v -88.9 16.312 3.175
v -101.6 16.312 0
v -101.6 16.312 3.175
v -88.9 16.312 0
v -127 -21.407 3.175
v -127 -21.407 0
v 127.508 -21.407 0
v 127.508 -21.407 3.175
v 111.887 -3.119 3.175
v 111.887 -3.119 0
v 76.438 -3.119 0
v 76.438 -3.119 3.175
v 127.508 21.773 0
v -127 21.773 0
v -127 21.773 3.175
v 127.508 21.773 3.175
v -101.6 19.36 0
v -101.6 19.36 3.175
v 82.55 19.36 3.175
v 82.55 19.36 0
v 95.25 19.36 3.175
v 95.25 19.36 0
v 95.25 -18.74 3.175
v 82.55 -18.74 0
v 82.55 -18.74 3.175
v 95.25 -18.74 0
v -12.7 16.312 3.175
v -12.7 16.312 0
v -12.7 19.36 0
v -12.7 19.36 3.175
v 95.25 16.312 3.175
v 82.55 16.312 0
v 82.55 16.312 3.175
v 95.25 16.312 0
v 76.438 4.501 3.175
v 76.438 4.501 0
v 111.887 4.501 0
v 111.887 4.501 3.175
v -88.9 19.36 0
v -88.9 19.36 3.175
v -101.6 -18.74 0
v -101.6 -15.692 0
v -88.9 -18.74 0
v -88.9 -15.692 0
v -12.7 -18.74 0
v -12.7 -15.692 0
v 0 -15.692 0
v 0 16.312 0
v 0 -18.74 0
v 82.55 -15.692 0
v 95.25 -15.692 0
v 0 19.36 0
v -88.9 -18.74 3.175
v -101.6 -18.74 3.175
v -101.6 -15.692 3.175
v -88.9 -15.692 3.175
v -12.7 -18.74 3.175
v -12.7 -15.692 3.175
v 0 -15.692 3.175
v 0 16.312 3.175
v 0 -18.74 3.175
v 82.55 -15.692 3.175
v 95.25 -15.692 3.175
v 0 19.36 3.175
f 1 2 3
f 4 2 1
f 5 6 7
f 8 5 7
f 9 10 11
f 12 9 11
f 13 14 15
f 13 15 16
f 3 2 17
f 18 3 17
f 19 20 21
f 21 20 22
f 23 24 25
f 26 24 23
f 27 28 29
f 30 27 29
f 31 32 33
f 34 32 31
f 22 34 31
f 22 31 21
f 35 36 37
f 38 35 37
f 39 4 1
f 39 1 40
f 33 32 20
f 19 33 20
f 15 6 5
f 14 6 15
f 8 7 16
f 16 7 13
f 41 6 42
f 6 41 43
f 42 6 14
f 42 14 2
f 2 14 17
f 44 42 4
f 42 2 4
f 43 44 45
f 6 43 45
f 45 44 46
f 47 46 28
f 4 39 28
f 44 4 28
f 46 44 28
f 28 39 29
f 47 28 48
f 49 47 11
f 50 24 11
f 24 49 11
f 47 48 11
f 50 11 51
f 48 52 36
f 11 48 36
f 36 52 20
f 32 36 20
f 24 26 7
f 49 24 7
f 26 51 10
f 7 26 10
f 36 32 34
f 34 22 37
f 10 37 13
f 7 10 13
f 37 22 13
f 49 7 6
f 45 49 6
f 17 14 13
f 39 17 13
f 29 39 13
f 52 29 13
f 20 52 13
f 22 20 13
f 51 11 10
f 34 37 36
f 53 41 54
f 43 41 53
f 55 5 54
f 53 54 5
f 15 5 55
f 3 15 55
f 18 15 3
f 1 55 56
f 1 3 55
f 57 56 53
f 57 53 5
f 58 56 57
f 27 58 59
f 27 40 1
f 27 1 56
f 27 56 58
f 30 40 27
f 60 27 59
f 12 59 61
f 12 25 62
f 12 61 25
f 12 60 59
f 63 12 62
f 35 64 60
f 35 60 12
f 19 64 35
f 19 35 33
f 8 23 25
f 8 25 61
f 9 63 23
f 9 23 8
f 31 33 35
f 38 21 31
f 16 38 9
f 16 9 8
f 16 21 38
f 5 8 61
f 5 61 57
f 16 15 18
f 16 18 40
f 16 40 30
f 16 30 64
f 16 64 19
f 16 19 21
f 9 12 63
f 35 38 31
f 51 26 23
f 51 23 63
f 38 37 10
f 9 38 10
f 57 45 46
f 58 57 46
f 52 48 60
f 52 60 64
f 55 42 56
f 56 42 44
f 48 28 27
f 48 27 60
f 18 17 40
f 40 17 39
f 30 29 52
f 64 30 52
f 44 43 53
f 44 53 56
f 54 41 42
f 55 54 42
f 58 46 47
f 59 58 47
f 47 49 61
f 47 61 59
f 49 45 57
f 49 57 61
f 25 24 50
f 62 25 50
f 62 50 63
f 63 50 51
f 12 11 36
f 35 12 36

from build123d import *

# Parameters (mm, degrees)
F0_W     = 254.508
F0_H     = 43.18
F0_W_2   = 12.7
F0_H_2   = 3.048
F1_DEPTH = 3.175


# Not quite as in the source:
# - a feature names something its author has since deleted; it is built from what else it names


with BuildPart() as f1:
    # F0 (on Top) → F1 (new body)
    with BuildSketch(Plane.XY):
        with Locations((0.254, 0.1834339905)):
            Rectangle(F0_W, F0_H)
        with Locations((-95.25, -17.2155660095)):
            Rectangle(F0_W_2, F0_H_2, mode=Mode.SUBTRACT)
        with Locations((-6.35, -17.2155660095)):
            Rectangle(F0_W_2, F0_H_2, mode=Mode.SUBTRACT)
        with Locations((88.9, -17.2155660095)):
            Rectangle(F0_W_2, F0_H_2, mode=Mode.SUBTRACT)
        with Locations((-95.25, 17.8364339905)):
            Rectangle(F0_W_2, F0_H_2, mode=Mode.SUBTRACT)
        with Locations((-6.35, 17.8364339905)):
            Rectangle(F0_W_2, F0_H_2, mode=Mode.SUBTRACT)
        Polygon((78.9593234658, -3.1185660095), (76.4378011227, -3.1185660095), (76.4378011227, 4.5014339905), (78.9593234658, 4.5014339905), (111.8867844343, 4.5014339905), (111.8867844343, -3.1185660095), align=None, mode=Mode.SUBTRACT)
        with Locations((88.9, 17.8364339905)):
            Rectangle(F0_W_2, F0_H_2, mode=Mode.SUBTRACT)
    extrude(amount=F1_DEPTH)


solid = f1.part
